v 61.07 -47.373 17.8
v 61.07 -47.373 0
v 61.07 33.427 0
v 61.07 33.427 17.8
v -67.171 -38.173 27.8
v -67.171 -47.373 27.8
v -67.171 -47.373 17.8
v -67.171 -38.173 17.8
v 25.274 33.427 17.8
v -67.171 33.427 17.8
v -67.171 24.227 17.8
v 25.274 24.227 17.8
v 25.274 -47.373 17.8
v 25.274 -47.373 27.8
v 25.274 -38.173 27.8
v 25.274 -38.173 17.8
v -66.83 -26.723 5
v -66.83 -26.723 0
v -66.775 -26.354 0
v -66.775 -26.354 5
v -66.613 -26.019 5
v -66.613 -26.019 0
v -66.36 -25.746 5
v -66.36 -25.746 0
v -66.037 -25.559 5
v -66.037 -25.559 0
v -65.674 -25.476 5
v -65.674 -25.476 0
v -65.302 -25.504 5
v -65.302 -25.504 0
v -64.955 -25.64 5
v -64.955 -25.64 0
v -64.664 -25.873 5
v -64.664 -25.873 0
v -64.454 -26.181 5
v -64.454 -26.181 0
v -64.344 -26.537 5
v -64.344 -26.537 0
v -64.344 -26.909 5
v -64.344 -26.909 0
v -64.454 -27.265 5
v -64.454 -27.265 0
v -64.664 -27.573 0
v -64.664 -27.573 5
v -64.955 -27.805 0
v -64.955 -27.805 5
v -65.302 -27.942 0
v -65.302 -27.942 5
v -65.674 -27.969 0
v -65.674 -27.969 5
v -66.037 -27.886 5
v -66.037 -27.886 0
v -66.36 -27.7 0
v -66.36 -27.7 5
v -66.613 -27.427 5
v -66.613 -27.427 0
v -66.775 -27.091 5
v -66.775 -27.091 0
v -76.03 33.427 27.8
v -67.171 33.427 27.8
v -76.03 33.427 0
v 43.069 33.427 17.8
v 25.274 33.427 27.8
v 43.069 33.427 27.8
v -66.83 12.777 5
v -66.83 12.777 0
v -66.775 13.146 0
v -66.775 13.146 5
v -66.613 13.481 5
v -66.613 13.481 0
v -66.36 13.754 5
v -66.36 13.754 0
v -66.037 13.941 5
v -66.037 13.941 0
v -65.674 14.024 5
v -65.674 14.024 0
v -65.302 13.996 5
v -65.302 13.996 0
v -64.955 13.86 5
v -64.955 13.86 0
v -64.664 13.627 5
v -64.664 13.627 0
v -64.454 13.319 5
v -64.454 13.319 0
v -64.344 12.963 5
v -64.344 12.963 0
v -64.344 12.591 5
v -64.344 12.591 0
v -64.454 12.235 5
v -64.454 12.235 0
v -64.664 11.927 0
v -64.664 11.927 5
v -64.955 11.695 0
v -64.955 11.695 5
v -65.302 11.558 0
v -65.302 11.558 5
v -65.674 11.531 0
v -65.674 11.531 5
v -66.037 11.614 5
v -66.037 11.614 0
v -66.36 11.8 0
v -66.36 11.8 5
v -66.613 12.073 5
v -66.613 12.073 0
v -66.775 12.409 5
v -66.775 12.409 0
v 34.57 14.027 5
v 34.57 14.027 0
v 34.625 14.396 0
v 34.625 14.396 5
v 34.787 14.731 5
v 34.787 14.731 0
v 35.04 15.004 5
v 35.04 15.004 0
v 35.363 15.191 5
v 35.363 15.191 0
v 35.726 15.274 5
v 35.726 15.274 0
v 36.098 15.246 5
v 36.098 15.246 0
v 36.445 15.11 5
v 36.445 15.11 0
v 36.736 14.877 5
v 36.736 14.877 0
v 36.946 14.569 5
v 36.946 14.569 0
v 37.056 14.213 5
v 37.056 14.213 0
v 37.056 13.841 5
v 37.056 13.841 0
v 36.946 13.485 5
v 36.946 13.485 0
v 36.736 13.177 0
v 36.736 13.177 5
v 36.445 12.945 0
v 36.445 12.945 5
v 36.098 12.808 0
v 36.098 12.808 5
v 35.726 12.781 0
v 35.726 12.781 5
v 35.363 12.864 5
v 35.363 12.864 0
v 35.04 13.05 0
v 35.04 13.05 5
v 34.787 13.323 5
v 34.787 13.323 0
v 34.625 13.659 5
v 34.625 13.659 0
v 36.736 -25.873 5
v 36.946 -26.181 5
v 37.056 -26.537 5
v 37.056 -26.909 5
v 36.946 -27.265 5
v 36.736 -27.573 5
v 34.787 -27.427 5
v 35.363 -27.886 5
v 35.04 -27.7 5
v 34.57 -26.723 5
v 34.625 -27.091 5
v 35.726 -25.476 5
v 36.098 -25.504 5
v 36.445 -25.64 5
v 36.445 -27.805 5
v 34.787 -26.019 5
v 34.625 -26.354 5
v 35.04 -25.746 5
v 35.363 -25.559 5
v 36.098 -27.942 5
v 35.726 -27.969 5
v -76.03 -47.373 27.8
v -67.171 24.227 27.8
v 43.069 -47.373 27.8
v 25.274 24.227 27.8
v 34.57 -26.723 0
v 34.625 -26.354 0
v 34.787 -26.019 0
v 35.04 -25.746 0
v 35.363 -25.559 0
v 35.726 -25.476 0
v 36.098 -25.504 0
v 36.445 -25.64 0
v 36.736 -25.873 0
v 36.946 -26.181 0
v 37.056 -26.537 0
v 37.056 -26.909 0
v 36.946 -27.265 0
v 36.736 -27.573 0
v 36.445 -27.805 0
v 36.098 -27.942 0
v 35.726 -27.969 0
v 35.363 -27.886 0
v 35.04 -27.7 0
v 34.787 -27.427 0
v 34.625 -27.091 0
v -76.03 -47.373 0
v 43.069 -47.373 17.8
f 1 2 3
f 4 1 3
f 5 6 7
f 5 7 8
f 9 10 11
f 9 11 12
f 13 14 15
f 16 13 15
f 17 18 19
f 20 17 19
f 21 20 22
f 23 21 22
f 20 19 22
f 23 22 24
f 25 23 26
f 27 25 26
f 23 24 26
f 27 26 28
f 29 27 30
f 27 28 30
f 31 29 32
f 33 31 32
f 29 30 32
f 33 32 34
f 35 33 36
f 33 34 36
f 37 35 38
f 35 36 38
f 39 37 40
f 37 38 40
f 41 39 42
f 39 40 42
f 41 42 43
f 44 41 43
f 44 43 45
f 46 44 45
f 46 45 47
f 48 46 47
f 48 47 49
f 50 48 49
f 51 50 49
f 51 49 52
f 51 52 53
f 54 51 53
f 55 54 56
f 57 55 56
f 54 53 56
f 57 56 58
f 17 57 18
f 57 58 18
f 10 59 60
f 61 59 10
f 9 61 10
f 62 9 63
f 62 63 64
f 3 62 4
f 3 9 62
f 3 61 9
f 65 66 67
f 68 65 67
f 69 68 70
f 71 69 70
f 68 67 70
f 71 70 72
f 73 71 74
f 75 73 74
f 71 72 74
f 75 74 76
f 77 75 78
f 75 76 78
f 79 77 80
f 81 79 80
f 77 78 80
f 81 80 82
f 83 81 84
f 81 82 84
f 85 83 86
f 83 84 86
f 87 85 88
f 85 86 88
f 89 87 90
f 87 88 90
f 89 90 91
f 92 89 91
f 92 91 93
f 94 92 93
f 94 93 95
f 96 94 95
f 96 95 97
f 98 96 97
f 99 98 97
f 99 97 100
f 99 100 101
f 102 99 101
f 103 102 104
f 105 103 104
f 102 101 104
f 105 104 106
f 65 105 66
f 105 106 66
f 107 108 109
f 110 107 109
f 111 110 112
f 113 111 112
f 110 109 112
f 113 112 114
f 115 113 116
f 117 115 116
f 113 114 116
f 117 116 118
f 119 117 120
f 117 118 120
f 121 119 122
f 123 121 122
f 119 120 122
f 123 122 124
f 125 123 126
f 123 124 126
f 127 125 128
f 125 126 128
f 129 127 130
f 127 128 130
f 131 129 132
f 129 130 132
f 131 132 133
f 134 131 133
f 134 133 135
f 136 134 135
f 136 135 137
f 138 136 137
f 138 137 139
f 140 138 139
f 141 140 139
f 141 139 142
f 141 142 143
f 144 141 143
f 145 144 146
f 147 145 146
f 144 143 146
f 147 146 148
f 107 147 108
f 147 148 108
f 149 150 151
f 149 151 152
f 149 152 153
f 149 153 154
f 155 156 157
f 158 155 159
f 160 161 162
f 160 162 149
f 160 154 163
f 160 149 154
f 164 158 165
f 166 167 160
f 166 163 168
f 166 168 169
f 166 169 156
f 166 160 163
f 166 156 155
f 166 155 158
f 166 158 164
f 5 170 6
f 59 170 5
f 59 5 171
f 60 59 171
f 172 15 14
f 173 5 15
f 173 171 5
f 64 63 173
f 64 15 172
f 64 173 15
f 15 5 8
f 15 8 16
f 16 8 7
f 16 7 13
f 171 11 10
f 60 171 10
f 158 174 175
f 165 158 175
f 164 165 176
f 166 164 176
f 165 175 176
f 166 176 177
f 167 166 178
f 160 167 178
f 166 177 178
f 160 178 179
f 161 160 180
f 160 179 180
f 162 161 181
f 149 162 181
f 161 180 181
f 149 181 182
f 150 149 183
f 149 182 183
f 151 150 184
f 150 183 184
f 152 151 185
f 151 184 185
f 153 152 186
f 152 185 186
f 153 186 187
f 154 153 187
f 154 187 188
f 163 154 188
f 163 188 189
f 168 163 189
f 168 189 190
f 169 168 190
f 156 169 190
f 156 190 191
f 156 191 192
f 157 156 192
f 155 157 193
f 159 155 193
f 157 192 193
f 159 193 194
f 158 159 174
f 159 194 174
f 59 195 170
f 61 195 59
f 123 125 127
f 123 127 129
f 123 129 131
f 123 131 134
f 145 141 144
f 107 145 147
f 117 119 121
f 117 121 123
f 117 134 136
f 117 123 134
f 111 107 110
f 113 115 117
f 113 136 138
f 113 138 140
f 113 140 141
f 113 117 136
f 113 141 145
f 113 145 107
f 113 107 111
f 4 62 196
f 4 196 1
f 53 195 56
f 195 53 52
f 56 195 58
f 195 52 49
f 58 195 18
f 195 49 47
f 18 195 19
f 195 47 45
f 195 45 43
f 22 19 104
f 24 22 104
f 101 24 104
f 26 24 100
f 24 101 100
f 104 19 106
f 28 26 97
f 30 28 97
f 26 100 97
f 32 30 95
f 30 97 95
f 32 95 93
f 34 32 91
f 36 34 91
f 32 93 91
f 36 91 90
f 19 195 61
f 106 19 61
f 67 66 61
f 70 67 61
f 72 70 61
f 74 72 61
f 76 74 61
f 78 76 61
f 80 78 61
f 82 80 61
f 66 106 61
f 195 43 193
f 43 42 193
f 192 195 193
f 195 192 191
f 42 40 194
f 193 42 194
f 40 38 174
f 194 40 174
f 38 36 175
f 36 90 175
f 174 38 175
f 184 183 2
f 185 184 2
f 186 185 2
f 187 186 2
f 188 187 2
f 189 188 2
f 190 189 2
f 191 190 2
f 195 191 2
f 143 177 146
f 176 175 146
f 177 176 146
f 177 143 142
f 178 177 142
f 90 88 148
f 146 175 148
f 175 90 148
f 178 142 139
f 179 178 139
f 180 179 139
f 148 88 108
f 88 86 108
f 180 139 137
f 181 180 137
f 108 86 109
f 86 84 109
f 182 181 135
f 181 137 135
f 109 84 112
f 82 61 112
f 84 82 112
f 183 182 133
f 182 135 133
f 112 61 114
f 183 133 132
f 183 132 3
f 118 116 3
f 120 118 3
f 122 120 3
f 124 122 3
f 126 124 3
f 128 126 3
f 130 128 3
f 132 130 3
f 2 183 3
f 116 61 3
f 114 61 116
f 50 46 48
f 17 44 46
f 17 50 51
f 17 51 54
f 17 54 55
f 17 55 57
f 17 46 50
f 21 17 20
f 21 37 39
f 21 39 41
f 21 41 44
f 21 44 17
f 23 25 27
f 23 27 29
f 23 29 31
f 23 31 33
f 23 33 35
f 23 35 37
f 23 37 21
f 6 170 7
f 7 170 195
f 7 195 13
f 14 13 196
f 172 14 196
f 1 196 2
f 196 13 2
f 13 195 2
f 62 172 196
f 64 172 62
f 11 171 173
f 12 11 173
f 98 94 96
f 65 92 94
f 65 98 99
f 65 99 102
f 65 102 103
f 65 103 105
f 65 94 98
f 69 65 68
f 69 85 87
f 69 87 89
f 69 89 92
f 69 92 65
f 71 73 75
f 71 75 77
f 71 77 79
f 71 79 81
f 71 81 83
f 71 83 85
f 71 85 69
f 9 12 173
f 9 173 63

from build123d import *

# Parameters (mm, degrees)
SZKIC1_W                    = 137.1
SZKIC1_H                    = 80.8
DODANIE_WYCI_GNI_CIE1_DEPTH = 27.8
SZKIC2_W                    = 92.445066106
SZKIC2_H                    = 9.2
SZKIC2_W_2                  = 18.000987162
SZKIC2_H_2                  = 80.8
WYTNIJ_WYCI_GNI_CIE1_DEPTH  = 10
SZKIC3_R                    = 1.25
WYTNIJ_WYCI_GNI_CIE2_DEPTH  = 5


with BuildPart() as part:
    # Szkic1 → Dodanie-wyciągnięcie1 (new body)
    with BuildSketch(Plane.XY):
        with Locations((-7.480300087, -6.972885306)):
            Rectangle(SZKIC1_W, SZKIC1_H)
    extrude(amount=DODANIE_WYCI_GNI_CIE1_DEPTH)

    # Szkic2 → Wytnij-wyciągnięcie1 (cut)
    with BuildSketch(Plane.XY.offset(27.8)):
        with Locations((-20.948912207, -42.772885306)):
            Rectangle(SZKIC2_W, SZKIC2_H)
        with Locations((-20.948912207, 28.827114694)):
            Rectangle(SZKIC2_W, SZKIC2_H)
        with Locations((52.069206332, -6.972885306)):
            Rectangle(SZKIC2_W_2, SZKIC2_H_2)
    extrude(amount=-WYTNIJ_WYCI_GNI_CIE1_DEPTH, mode=Mode.SUBTRACT)

    # Szkic3 → Wytnij-wyciągnięcie2 (cut)
    with BuildSketch(Plane(origin=(0, 0, 0), x_dir=(-1, 0, 0), z_dir=(0, 0, -1))):
        with Locations((65.580300087, 12.777114694)):
            Circle(SZKIC3_R)
        with Locations((65.580300087, -26.722885306)):
            Circle(SZKIC3_R)
        with Locations((-35.819699913, -26.722885306)):
            Circle(SZKIC3_R)
        with Locations((-35.819699913, 14.027114694)):
            Circle(SZKIC3_R)
    extrude(amount=-WYTNIJ_WYCI_GNI_CIE2_DEPTH, mode=Mode.SUBTRACT)


solid = part.part
